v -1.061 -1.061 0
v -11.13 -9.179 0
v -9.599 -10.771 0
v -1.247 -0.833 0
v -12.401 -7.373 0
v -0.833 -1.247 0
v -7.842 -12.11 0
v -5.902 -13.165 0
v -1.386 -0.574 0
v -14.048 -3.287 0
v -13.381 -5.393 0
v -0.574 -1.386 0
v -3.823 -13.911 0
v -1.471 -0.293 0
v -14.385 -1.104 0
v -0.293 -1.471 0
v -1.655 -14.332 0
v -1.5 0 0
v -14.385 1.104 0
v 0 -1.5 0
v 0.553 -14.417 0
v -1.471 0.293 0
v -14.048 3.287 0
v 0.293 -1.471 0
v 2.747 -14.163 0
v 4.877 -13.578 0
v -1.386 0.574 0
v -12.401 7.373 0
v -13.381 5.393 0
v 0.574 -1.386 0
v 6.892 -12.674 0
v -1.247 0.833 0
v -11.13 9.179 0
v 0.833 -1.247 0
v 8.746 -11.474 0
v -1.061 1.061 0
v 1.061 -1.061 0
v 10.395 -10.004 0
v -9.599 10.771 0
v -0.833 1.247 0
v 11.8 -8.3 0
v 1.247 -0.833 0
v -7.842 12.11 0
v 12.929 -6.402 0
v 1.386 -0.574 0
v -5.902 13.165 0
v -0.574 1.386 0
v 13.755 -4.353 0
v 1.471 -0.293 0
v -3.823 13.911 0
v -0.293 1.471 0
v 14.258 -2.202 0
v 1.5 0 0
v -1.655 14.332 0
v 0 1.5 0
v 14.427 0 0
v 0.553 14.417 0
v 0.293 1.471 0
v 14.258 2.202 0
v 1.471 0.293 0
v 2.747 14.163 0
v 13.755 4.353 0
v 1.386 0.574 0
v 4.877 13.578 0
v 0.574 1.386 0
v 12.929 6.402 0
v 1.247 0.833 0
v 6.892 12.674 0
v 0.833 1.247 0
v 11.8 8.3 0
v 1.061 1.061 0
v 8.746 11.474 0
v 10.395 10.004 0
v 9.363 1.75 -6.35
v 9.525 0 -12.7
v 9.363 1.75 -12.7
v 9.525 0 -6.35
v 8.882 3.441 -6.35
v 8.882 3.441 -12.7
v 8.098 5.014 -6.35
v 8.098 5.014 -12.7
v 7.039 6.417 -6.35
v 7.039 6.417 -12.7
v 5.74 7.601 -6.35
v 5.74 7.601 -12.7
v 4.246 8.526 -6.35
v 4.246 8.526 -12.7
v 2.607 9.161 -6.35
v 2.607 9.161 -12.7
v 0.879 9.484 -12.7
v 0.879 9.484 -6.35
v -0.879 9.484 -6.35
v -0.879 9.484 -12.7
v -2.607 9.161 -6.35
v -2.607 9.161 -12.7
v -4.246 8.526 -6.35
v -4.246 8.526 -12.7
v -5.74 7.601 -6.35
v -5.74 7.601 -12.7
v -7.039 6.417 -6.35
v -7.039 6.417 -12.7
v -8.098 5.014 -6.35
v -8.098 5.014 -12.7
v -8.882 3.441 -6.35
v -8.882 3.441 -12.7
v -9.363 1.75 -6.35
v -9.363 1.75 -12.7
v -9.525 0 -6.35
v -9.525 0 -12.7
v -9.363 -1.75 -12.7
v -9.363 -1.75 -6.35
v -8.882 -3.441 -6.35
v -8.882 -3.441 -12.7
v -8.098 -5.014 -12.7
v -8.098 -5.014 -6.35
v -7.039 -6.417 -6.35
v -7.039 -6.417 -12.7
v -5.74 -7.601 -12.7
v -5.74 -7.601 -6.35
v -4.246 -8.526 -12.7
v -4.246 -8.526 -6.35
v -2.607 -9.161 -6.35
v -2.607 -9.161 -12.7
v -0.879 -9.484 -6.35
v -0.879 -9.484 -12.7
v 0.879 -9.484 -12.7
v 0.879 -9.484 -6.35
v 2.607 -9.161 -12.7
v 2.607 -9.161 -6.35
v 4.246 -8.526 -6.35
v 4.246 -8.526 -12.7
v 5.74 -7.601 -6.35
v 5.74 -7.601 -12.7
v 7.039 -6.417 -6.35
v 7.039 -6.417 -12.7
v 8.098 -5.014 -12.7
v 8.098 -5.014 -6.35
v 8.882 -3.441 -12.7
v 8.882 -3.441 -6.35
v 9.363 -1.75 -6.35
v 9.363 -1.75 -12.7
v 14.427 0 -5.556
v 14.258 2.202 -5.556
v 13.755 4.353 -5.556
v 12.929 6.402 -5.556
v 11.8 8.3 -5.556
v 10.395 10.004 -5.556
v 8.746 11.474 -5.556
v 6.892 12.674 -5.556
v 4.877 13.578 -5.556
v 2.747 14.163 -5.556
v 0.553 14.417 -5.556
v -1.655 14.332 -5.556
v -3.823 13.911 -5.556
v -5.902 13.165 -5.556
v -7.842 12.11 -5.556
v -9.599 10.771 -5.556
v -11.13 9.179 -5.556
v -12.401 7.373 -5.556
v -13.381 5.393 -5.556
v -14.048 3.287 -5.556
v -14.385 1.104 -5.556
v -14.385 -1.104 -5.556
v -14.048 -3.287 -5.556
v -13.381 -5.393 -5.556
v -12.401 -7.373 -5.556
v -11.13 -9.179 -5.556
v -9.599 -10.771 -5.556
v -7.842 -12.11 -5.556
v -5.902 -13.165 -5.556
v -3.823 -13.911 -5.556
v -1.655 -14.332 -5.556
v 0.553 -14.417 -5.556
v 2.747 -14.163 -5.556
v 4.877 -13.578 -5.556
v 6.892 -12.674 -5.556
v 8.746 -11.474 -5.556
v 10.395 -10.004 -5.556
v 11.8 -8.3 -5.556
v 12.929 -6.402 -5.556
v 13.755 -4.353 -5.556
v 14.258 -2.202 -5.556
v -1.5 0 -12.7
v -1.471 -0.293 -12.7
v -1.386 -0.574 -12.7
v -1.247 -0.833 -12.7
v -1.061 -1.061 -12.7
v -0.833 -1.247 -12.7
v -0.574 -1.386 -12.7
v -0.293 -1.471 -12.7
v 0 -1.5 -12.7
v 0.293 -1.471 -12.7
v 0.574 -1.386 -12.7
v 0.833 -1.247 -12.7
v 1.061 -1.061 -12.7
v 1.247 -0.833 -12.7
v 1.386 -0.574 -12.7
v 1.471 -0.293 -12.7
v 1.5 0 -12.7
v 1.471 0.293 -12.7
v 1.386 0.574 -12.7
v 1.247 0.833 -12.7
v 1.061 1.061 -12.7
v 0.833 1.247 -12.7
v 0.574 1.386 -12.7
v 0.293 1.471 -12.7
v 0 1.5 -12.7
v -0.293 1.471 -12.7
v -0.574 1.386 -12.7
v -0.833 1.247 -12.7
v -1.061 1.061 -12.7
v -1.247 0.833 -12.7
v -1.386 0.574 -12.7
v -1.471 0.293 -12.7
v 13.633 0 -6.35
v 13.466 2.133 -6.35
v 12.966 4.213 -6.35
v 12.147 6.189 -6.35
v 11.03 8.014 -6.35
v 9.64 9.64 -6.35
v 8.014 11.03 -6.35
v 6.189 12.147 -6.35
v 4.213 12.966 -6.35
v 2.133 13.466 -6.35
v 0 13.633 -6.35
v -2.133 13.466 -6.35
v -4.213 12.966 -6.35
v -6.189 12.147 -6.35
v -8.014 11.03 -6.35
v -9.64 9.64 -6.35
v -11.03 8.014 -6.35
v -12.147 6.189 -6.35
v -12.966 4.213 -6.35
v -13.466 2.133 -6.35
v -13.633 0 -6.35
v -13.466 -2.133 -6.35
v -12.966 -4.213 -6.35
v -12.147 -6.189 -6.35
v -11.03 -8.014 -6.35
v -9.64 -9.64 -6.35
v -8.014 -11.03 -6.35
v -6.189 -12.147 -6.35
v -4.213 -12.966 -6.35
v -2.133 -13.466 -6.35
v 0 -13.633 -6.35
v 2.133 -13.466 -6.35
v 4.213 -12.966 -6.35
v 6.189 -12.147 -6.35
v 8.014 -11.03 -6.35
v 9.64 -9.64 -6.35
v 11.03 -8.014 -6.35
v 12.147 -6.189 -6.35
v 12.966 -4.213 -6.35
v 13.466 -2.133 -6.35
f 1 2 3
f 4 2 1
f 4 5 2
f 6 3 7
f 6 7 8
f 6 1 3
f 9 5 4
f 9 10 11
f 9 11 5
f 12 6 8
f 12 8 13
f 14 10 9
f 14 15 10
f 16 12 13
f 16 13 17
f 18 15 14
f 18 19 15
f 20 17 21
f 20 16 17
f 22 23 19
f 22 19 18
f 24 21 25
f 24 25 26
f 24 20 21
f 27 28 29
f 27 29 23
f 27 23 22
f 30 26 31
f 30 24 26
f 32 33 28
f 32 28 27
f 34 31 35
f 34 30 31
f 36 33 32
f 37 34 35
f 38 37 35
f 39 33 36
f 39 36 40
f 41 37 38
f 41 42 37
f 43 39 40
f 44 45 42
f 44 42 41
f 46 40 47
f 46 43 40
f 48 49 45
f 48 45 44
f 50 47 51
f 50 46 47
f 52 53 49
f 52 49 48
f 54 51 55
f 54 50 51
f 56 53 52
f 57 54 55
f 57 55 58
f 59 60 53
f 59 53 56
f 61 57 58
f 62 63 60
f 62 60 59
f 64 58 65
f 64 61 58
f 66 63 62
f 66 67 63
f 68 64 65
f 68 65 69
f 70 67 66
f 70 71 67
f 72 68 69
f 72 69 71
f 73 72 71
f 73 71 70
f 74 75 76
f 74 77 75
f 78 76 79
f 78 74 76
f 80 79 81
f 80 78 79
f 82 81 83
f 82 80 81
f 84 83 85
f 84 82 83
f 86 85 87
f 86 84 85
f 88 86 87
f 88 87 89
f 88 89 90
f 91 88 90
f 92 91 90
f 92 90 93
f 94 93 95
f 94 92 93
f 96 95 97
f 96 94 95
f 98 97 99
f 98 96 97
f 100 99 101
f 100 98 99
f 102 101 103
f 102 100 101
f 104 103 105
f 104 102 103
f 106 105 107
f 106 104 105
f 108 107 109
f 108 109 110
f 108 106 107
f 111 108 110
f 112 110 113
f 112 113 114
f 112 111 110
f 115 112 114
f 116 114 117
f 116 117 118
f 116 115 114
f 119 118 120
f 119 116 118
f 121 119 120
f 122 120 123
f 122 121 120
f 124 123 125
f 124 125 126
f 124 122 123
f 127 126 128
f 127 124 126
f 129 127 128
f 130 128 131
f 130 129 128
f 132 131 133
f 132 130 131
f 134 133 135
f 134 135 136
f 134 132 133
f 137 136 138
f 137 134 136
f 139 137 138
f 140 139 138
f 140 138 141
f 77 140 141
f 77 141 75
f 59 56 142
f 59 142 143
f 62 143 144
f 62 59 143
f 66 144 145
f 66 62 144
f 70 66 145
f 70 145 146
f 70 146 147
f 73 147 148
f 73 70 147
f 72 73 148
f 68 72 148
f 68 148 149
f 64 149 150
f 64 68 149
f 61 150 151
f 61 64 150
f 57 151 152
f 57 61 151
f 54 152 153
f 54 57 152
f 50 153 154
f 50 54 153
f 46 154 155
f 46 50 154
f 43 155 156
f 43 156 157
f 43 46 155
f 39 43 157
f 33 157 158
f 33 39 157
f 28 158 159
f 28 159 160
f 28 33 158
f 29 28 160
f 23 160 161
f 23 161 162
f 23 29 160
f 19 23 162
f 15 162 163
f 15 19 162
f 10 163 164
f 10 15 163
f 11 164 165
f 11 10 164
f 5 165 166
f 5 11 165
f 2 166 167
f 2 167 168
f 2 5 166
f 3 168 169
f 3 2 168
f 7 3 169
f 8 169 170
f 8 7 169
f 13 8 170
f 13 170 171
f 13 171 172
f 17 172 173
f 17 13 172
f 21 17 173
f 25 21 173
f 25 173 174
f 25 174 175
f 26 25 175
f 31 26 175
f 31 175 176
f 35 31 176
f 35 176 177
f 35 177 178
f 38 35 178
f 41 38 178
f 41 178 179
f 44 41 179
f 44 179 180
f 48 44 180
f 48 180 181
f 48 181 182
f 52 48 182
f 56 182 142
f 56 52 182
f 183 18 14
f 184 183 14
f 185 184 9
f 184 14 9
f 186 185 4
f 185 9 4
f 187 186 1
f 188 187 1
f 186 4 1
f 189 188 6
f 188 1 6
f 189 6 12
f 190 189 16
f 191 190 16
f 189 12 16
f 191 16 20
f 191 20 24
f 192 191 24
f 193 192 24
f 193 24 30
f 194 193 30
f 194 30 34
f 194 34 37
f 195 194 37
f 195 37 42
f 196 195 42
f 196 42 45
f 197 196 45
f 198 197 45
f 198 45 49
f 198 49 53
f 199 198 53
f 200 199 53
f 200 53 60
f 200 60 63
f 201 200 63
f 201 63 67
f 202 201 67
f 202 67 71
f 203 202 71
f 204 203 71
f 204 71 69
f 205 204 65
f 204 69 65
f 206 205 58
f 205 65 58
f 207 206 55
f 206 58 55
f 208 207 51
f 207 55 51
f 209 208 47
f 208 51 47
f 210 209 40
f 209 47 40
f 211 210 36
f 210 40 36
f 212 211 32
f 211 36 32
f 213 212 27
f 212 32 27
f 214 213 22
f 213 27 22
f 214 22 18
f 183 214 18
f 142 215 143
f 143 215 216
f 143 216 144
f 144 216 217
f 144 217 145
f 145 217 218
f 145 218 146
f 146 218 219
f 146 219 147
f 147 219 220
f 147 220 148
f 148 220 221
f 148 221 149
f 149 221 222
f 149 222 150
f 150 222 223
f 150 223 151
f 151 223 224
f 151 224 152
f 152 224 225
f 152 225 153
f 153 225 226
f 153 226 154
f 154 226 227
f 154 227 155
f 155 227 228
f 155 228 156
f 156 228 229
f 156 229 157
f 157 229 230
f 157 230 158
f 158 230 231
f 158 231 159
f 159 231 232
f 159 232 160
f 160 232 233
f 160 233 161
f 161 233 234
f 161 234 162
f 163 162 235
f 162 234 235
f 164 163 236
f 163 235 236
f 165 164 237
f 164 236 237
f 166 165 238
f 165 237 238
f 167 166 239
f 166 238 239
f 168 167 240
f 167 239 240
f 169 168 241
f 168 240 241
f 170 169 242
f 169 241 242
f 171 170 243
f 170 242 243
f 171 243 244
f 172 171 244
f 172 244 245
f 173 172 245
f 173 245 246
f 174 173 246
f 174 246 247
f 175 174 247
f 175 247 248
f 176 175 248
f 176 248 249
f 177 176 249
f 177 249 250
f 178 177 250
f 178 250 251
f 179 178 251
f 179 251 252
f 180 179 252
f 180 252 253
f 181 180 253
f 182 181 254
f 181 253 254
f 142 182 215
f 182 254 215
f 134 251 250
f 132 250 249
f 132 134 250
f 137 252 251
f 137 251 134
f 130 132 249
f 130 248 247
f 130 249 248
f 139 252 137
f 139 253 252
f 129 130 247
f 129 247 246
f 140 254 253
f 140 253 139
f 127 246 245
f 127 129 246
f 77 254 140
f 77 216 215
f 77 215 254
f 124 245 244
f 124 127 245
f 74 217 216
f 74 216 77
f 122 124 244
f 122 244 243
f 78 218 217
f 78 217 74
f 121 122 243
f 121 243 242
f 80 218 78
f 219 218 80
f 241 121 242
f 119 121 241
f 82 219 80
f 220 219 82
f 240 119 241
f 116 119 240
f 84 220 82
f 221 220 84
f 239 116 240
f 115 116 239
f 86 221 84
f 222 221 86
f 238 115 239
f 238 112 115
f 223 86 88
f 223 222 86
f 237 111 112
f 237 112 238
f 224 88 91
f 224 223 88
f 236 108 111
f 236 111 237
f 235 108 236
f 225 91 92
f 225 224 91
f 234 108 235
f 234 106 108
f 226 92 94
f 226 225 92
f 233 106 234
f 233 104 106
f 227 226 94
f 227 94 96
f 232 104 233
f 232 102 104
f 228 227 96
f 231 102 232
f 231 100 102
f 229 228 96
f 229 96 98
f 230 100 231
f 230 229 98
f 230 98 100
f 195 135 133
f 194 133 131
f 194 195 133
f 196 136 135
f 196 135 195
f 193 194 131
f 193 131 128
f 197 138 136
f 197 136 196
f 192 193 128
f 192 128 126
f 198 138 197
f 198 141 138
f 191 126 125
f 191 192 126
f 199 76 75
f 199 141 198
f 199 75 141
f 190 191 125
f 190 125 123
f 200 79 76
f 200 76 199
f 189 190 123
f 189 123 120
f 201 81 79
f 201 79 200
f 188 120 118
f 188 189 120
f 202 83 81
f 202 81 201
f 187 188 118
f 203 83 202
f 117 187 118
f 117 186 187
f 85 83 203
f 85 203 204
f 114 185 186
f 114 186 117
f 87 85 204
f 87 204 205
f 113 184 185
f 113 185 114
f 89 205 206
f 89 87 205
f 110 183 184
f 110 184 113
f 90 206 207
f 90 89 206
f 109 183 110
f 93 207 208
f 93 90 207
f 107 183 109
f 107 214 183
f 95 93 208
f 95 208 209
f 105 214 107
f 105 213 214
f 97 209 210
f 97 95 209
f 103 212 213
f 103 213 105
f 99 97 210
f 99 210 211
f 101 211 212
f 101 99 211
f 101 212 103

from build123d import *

# Parameters (mm, degrees)
F3_D     = 2.0574
F5_D     = 3
F5_DEPTH = 19.05
F5_TIP   = 0.9012909285
F6_SIZE  = 0.79375


with BuildPart() as f1:
    # F0 (on Front) → F1 (revolve)
    with BuildSketch(Plane.XZ):
        Polygon((14.4272, 0), (0, 0), (0, -12.7), (9.525, -12.7), (9.525, -6.35), (14.4272, -6.35), align=None)
    revolve(axis=Axis((0, 0, -6.35), (0, 0, 1)))

    # F3 (through all)
    with Locations(Plane.XY):
        with Locations((0, 0)):
            Hole(F3_D / 2)

    # F5
    with Locations(Plane(origin=(0, 0, -12.7), x_dir=(1, 0, 0), z_dir=(0, 0, -1))):
        with Locations((0, 0)):
            Hole(F5_D / 2, depth=F5_DEPTH)
            with Locations((0, 0, -(F5_DEPTH + F5_TIP / 2))):  # 118° drill point
                Cone(0, F5_D / 2, F5_TIP, mode=Mode.SUBTRACT)

    # F6
    f6_edges = [f1.edges().sort_by_distance(p)[0] for p in [
        (-14.4272, 0, -6.35),
    ]]
    chamfer(f6_edges, length=F6_SIZE)


solid = f1.part
